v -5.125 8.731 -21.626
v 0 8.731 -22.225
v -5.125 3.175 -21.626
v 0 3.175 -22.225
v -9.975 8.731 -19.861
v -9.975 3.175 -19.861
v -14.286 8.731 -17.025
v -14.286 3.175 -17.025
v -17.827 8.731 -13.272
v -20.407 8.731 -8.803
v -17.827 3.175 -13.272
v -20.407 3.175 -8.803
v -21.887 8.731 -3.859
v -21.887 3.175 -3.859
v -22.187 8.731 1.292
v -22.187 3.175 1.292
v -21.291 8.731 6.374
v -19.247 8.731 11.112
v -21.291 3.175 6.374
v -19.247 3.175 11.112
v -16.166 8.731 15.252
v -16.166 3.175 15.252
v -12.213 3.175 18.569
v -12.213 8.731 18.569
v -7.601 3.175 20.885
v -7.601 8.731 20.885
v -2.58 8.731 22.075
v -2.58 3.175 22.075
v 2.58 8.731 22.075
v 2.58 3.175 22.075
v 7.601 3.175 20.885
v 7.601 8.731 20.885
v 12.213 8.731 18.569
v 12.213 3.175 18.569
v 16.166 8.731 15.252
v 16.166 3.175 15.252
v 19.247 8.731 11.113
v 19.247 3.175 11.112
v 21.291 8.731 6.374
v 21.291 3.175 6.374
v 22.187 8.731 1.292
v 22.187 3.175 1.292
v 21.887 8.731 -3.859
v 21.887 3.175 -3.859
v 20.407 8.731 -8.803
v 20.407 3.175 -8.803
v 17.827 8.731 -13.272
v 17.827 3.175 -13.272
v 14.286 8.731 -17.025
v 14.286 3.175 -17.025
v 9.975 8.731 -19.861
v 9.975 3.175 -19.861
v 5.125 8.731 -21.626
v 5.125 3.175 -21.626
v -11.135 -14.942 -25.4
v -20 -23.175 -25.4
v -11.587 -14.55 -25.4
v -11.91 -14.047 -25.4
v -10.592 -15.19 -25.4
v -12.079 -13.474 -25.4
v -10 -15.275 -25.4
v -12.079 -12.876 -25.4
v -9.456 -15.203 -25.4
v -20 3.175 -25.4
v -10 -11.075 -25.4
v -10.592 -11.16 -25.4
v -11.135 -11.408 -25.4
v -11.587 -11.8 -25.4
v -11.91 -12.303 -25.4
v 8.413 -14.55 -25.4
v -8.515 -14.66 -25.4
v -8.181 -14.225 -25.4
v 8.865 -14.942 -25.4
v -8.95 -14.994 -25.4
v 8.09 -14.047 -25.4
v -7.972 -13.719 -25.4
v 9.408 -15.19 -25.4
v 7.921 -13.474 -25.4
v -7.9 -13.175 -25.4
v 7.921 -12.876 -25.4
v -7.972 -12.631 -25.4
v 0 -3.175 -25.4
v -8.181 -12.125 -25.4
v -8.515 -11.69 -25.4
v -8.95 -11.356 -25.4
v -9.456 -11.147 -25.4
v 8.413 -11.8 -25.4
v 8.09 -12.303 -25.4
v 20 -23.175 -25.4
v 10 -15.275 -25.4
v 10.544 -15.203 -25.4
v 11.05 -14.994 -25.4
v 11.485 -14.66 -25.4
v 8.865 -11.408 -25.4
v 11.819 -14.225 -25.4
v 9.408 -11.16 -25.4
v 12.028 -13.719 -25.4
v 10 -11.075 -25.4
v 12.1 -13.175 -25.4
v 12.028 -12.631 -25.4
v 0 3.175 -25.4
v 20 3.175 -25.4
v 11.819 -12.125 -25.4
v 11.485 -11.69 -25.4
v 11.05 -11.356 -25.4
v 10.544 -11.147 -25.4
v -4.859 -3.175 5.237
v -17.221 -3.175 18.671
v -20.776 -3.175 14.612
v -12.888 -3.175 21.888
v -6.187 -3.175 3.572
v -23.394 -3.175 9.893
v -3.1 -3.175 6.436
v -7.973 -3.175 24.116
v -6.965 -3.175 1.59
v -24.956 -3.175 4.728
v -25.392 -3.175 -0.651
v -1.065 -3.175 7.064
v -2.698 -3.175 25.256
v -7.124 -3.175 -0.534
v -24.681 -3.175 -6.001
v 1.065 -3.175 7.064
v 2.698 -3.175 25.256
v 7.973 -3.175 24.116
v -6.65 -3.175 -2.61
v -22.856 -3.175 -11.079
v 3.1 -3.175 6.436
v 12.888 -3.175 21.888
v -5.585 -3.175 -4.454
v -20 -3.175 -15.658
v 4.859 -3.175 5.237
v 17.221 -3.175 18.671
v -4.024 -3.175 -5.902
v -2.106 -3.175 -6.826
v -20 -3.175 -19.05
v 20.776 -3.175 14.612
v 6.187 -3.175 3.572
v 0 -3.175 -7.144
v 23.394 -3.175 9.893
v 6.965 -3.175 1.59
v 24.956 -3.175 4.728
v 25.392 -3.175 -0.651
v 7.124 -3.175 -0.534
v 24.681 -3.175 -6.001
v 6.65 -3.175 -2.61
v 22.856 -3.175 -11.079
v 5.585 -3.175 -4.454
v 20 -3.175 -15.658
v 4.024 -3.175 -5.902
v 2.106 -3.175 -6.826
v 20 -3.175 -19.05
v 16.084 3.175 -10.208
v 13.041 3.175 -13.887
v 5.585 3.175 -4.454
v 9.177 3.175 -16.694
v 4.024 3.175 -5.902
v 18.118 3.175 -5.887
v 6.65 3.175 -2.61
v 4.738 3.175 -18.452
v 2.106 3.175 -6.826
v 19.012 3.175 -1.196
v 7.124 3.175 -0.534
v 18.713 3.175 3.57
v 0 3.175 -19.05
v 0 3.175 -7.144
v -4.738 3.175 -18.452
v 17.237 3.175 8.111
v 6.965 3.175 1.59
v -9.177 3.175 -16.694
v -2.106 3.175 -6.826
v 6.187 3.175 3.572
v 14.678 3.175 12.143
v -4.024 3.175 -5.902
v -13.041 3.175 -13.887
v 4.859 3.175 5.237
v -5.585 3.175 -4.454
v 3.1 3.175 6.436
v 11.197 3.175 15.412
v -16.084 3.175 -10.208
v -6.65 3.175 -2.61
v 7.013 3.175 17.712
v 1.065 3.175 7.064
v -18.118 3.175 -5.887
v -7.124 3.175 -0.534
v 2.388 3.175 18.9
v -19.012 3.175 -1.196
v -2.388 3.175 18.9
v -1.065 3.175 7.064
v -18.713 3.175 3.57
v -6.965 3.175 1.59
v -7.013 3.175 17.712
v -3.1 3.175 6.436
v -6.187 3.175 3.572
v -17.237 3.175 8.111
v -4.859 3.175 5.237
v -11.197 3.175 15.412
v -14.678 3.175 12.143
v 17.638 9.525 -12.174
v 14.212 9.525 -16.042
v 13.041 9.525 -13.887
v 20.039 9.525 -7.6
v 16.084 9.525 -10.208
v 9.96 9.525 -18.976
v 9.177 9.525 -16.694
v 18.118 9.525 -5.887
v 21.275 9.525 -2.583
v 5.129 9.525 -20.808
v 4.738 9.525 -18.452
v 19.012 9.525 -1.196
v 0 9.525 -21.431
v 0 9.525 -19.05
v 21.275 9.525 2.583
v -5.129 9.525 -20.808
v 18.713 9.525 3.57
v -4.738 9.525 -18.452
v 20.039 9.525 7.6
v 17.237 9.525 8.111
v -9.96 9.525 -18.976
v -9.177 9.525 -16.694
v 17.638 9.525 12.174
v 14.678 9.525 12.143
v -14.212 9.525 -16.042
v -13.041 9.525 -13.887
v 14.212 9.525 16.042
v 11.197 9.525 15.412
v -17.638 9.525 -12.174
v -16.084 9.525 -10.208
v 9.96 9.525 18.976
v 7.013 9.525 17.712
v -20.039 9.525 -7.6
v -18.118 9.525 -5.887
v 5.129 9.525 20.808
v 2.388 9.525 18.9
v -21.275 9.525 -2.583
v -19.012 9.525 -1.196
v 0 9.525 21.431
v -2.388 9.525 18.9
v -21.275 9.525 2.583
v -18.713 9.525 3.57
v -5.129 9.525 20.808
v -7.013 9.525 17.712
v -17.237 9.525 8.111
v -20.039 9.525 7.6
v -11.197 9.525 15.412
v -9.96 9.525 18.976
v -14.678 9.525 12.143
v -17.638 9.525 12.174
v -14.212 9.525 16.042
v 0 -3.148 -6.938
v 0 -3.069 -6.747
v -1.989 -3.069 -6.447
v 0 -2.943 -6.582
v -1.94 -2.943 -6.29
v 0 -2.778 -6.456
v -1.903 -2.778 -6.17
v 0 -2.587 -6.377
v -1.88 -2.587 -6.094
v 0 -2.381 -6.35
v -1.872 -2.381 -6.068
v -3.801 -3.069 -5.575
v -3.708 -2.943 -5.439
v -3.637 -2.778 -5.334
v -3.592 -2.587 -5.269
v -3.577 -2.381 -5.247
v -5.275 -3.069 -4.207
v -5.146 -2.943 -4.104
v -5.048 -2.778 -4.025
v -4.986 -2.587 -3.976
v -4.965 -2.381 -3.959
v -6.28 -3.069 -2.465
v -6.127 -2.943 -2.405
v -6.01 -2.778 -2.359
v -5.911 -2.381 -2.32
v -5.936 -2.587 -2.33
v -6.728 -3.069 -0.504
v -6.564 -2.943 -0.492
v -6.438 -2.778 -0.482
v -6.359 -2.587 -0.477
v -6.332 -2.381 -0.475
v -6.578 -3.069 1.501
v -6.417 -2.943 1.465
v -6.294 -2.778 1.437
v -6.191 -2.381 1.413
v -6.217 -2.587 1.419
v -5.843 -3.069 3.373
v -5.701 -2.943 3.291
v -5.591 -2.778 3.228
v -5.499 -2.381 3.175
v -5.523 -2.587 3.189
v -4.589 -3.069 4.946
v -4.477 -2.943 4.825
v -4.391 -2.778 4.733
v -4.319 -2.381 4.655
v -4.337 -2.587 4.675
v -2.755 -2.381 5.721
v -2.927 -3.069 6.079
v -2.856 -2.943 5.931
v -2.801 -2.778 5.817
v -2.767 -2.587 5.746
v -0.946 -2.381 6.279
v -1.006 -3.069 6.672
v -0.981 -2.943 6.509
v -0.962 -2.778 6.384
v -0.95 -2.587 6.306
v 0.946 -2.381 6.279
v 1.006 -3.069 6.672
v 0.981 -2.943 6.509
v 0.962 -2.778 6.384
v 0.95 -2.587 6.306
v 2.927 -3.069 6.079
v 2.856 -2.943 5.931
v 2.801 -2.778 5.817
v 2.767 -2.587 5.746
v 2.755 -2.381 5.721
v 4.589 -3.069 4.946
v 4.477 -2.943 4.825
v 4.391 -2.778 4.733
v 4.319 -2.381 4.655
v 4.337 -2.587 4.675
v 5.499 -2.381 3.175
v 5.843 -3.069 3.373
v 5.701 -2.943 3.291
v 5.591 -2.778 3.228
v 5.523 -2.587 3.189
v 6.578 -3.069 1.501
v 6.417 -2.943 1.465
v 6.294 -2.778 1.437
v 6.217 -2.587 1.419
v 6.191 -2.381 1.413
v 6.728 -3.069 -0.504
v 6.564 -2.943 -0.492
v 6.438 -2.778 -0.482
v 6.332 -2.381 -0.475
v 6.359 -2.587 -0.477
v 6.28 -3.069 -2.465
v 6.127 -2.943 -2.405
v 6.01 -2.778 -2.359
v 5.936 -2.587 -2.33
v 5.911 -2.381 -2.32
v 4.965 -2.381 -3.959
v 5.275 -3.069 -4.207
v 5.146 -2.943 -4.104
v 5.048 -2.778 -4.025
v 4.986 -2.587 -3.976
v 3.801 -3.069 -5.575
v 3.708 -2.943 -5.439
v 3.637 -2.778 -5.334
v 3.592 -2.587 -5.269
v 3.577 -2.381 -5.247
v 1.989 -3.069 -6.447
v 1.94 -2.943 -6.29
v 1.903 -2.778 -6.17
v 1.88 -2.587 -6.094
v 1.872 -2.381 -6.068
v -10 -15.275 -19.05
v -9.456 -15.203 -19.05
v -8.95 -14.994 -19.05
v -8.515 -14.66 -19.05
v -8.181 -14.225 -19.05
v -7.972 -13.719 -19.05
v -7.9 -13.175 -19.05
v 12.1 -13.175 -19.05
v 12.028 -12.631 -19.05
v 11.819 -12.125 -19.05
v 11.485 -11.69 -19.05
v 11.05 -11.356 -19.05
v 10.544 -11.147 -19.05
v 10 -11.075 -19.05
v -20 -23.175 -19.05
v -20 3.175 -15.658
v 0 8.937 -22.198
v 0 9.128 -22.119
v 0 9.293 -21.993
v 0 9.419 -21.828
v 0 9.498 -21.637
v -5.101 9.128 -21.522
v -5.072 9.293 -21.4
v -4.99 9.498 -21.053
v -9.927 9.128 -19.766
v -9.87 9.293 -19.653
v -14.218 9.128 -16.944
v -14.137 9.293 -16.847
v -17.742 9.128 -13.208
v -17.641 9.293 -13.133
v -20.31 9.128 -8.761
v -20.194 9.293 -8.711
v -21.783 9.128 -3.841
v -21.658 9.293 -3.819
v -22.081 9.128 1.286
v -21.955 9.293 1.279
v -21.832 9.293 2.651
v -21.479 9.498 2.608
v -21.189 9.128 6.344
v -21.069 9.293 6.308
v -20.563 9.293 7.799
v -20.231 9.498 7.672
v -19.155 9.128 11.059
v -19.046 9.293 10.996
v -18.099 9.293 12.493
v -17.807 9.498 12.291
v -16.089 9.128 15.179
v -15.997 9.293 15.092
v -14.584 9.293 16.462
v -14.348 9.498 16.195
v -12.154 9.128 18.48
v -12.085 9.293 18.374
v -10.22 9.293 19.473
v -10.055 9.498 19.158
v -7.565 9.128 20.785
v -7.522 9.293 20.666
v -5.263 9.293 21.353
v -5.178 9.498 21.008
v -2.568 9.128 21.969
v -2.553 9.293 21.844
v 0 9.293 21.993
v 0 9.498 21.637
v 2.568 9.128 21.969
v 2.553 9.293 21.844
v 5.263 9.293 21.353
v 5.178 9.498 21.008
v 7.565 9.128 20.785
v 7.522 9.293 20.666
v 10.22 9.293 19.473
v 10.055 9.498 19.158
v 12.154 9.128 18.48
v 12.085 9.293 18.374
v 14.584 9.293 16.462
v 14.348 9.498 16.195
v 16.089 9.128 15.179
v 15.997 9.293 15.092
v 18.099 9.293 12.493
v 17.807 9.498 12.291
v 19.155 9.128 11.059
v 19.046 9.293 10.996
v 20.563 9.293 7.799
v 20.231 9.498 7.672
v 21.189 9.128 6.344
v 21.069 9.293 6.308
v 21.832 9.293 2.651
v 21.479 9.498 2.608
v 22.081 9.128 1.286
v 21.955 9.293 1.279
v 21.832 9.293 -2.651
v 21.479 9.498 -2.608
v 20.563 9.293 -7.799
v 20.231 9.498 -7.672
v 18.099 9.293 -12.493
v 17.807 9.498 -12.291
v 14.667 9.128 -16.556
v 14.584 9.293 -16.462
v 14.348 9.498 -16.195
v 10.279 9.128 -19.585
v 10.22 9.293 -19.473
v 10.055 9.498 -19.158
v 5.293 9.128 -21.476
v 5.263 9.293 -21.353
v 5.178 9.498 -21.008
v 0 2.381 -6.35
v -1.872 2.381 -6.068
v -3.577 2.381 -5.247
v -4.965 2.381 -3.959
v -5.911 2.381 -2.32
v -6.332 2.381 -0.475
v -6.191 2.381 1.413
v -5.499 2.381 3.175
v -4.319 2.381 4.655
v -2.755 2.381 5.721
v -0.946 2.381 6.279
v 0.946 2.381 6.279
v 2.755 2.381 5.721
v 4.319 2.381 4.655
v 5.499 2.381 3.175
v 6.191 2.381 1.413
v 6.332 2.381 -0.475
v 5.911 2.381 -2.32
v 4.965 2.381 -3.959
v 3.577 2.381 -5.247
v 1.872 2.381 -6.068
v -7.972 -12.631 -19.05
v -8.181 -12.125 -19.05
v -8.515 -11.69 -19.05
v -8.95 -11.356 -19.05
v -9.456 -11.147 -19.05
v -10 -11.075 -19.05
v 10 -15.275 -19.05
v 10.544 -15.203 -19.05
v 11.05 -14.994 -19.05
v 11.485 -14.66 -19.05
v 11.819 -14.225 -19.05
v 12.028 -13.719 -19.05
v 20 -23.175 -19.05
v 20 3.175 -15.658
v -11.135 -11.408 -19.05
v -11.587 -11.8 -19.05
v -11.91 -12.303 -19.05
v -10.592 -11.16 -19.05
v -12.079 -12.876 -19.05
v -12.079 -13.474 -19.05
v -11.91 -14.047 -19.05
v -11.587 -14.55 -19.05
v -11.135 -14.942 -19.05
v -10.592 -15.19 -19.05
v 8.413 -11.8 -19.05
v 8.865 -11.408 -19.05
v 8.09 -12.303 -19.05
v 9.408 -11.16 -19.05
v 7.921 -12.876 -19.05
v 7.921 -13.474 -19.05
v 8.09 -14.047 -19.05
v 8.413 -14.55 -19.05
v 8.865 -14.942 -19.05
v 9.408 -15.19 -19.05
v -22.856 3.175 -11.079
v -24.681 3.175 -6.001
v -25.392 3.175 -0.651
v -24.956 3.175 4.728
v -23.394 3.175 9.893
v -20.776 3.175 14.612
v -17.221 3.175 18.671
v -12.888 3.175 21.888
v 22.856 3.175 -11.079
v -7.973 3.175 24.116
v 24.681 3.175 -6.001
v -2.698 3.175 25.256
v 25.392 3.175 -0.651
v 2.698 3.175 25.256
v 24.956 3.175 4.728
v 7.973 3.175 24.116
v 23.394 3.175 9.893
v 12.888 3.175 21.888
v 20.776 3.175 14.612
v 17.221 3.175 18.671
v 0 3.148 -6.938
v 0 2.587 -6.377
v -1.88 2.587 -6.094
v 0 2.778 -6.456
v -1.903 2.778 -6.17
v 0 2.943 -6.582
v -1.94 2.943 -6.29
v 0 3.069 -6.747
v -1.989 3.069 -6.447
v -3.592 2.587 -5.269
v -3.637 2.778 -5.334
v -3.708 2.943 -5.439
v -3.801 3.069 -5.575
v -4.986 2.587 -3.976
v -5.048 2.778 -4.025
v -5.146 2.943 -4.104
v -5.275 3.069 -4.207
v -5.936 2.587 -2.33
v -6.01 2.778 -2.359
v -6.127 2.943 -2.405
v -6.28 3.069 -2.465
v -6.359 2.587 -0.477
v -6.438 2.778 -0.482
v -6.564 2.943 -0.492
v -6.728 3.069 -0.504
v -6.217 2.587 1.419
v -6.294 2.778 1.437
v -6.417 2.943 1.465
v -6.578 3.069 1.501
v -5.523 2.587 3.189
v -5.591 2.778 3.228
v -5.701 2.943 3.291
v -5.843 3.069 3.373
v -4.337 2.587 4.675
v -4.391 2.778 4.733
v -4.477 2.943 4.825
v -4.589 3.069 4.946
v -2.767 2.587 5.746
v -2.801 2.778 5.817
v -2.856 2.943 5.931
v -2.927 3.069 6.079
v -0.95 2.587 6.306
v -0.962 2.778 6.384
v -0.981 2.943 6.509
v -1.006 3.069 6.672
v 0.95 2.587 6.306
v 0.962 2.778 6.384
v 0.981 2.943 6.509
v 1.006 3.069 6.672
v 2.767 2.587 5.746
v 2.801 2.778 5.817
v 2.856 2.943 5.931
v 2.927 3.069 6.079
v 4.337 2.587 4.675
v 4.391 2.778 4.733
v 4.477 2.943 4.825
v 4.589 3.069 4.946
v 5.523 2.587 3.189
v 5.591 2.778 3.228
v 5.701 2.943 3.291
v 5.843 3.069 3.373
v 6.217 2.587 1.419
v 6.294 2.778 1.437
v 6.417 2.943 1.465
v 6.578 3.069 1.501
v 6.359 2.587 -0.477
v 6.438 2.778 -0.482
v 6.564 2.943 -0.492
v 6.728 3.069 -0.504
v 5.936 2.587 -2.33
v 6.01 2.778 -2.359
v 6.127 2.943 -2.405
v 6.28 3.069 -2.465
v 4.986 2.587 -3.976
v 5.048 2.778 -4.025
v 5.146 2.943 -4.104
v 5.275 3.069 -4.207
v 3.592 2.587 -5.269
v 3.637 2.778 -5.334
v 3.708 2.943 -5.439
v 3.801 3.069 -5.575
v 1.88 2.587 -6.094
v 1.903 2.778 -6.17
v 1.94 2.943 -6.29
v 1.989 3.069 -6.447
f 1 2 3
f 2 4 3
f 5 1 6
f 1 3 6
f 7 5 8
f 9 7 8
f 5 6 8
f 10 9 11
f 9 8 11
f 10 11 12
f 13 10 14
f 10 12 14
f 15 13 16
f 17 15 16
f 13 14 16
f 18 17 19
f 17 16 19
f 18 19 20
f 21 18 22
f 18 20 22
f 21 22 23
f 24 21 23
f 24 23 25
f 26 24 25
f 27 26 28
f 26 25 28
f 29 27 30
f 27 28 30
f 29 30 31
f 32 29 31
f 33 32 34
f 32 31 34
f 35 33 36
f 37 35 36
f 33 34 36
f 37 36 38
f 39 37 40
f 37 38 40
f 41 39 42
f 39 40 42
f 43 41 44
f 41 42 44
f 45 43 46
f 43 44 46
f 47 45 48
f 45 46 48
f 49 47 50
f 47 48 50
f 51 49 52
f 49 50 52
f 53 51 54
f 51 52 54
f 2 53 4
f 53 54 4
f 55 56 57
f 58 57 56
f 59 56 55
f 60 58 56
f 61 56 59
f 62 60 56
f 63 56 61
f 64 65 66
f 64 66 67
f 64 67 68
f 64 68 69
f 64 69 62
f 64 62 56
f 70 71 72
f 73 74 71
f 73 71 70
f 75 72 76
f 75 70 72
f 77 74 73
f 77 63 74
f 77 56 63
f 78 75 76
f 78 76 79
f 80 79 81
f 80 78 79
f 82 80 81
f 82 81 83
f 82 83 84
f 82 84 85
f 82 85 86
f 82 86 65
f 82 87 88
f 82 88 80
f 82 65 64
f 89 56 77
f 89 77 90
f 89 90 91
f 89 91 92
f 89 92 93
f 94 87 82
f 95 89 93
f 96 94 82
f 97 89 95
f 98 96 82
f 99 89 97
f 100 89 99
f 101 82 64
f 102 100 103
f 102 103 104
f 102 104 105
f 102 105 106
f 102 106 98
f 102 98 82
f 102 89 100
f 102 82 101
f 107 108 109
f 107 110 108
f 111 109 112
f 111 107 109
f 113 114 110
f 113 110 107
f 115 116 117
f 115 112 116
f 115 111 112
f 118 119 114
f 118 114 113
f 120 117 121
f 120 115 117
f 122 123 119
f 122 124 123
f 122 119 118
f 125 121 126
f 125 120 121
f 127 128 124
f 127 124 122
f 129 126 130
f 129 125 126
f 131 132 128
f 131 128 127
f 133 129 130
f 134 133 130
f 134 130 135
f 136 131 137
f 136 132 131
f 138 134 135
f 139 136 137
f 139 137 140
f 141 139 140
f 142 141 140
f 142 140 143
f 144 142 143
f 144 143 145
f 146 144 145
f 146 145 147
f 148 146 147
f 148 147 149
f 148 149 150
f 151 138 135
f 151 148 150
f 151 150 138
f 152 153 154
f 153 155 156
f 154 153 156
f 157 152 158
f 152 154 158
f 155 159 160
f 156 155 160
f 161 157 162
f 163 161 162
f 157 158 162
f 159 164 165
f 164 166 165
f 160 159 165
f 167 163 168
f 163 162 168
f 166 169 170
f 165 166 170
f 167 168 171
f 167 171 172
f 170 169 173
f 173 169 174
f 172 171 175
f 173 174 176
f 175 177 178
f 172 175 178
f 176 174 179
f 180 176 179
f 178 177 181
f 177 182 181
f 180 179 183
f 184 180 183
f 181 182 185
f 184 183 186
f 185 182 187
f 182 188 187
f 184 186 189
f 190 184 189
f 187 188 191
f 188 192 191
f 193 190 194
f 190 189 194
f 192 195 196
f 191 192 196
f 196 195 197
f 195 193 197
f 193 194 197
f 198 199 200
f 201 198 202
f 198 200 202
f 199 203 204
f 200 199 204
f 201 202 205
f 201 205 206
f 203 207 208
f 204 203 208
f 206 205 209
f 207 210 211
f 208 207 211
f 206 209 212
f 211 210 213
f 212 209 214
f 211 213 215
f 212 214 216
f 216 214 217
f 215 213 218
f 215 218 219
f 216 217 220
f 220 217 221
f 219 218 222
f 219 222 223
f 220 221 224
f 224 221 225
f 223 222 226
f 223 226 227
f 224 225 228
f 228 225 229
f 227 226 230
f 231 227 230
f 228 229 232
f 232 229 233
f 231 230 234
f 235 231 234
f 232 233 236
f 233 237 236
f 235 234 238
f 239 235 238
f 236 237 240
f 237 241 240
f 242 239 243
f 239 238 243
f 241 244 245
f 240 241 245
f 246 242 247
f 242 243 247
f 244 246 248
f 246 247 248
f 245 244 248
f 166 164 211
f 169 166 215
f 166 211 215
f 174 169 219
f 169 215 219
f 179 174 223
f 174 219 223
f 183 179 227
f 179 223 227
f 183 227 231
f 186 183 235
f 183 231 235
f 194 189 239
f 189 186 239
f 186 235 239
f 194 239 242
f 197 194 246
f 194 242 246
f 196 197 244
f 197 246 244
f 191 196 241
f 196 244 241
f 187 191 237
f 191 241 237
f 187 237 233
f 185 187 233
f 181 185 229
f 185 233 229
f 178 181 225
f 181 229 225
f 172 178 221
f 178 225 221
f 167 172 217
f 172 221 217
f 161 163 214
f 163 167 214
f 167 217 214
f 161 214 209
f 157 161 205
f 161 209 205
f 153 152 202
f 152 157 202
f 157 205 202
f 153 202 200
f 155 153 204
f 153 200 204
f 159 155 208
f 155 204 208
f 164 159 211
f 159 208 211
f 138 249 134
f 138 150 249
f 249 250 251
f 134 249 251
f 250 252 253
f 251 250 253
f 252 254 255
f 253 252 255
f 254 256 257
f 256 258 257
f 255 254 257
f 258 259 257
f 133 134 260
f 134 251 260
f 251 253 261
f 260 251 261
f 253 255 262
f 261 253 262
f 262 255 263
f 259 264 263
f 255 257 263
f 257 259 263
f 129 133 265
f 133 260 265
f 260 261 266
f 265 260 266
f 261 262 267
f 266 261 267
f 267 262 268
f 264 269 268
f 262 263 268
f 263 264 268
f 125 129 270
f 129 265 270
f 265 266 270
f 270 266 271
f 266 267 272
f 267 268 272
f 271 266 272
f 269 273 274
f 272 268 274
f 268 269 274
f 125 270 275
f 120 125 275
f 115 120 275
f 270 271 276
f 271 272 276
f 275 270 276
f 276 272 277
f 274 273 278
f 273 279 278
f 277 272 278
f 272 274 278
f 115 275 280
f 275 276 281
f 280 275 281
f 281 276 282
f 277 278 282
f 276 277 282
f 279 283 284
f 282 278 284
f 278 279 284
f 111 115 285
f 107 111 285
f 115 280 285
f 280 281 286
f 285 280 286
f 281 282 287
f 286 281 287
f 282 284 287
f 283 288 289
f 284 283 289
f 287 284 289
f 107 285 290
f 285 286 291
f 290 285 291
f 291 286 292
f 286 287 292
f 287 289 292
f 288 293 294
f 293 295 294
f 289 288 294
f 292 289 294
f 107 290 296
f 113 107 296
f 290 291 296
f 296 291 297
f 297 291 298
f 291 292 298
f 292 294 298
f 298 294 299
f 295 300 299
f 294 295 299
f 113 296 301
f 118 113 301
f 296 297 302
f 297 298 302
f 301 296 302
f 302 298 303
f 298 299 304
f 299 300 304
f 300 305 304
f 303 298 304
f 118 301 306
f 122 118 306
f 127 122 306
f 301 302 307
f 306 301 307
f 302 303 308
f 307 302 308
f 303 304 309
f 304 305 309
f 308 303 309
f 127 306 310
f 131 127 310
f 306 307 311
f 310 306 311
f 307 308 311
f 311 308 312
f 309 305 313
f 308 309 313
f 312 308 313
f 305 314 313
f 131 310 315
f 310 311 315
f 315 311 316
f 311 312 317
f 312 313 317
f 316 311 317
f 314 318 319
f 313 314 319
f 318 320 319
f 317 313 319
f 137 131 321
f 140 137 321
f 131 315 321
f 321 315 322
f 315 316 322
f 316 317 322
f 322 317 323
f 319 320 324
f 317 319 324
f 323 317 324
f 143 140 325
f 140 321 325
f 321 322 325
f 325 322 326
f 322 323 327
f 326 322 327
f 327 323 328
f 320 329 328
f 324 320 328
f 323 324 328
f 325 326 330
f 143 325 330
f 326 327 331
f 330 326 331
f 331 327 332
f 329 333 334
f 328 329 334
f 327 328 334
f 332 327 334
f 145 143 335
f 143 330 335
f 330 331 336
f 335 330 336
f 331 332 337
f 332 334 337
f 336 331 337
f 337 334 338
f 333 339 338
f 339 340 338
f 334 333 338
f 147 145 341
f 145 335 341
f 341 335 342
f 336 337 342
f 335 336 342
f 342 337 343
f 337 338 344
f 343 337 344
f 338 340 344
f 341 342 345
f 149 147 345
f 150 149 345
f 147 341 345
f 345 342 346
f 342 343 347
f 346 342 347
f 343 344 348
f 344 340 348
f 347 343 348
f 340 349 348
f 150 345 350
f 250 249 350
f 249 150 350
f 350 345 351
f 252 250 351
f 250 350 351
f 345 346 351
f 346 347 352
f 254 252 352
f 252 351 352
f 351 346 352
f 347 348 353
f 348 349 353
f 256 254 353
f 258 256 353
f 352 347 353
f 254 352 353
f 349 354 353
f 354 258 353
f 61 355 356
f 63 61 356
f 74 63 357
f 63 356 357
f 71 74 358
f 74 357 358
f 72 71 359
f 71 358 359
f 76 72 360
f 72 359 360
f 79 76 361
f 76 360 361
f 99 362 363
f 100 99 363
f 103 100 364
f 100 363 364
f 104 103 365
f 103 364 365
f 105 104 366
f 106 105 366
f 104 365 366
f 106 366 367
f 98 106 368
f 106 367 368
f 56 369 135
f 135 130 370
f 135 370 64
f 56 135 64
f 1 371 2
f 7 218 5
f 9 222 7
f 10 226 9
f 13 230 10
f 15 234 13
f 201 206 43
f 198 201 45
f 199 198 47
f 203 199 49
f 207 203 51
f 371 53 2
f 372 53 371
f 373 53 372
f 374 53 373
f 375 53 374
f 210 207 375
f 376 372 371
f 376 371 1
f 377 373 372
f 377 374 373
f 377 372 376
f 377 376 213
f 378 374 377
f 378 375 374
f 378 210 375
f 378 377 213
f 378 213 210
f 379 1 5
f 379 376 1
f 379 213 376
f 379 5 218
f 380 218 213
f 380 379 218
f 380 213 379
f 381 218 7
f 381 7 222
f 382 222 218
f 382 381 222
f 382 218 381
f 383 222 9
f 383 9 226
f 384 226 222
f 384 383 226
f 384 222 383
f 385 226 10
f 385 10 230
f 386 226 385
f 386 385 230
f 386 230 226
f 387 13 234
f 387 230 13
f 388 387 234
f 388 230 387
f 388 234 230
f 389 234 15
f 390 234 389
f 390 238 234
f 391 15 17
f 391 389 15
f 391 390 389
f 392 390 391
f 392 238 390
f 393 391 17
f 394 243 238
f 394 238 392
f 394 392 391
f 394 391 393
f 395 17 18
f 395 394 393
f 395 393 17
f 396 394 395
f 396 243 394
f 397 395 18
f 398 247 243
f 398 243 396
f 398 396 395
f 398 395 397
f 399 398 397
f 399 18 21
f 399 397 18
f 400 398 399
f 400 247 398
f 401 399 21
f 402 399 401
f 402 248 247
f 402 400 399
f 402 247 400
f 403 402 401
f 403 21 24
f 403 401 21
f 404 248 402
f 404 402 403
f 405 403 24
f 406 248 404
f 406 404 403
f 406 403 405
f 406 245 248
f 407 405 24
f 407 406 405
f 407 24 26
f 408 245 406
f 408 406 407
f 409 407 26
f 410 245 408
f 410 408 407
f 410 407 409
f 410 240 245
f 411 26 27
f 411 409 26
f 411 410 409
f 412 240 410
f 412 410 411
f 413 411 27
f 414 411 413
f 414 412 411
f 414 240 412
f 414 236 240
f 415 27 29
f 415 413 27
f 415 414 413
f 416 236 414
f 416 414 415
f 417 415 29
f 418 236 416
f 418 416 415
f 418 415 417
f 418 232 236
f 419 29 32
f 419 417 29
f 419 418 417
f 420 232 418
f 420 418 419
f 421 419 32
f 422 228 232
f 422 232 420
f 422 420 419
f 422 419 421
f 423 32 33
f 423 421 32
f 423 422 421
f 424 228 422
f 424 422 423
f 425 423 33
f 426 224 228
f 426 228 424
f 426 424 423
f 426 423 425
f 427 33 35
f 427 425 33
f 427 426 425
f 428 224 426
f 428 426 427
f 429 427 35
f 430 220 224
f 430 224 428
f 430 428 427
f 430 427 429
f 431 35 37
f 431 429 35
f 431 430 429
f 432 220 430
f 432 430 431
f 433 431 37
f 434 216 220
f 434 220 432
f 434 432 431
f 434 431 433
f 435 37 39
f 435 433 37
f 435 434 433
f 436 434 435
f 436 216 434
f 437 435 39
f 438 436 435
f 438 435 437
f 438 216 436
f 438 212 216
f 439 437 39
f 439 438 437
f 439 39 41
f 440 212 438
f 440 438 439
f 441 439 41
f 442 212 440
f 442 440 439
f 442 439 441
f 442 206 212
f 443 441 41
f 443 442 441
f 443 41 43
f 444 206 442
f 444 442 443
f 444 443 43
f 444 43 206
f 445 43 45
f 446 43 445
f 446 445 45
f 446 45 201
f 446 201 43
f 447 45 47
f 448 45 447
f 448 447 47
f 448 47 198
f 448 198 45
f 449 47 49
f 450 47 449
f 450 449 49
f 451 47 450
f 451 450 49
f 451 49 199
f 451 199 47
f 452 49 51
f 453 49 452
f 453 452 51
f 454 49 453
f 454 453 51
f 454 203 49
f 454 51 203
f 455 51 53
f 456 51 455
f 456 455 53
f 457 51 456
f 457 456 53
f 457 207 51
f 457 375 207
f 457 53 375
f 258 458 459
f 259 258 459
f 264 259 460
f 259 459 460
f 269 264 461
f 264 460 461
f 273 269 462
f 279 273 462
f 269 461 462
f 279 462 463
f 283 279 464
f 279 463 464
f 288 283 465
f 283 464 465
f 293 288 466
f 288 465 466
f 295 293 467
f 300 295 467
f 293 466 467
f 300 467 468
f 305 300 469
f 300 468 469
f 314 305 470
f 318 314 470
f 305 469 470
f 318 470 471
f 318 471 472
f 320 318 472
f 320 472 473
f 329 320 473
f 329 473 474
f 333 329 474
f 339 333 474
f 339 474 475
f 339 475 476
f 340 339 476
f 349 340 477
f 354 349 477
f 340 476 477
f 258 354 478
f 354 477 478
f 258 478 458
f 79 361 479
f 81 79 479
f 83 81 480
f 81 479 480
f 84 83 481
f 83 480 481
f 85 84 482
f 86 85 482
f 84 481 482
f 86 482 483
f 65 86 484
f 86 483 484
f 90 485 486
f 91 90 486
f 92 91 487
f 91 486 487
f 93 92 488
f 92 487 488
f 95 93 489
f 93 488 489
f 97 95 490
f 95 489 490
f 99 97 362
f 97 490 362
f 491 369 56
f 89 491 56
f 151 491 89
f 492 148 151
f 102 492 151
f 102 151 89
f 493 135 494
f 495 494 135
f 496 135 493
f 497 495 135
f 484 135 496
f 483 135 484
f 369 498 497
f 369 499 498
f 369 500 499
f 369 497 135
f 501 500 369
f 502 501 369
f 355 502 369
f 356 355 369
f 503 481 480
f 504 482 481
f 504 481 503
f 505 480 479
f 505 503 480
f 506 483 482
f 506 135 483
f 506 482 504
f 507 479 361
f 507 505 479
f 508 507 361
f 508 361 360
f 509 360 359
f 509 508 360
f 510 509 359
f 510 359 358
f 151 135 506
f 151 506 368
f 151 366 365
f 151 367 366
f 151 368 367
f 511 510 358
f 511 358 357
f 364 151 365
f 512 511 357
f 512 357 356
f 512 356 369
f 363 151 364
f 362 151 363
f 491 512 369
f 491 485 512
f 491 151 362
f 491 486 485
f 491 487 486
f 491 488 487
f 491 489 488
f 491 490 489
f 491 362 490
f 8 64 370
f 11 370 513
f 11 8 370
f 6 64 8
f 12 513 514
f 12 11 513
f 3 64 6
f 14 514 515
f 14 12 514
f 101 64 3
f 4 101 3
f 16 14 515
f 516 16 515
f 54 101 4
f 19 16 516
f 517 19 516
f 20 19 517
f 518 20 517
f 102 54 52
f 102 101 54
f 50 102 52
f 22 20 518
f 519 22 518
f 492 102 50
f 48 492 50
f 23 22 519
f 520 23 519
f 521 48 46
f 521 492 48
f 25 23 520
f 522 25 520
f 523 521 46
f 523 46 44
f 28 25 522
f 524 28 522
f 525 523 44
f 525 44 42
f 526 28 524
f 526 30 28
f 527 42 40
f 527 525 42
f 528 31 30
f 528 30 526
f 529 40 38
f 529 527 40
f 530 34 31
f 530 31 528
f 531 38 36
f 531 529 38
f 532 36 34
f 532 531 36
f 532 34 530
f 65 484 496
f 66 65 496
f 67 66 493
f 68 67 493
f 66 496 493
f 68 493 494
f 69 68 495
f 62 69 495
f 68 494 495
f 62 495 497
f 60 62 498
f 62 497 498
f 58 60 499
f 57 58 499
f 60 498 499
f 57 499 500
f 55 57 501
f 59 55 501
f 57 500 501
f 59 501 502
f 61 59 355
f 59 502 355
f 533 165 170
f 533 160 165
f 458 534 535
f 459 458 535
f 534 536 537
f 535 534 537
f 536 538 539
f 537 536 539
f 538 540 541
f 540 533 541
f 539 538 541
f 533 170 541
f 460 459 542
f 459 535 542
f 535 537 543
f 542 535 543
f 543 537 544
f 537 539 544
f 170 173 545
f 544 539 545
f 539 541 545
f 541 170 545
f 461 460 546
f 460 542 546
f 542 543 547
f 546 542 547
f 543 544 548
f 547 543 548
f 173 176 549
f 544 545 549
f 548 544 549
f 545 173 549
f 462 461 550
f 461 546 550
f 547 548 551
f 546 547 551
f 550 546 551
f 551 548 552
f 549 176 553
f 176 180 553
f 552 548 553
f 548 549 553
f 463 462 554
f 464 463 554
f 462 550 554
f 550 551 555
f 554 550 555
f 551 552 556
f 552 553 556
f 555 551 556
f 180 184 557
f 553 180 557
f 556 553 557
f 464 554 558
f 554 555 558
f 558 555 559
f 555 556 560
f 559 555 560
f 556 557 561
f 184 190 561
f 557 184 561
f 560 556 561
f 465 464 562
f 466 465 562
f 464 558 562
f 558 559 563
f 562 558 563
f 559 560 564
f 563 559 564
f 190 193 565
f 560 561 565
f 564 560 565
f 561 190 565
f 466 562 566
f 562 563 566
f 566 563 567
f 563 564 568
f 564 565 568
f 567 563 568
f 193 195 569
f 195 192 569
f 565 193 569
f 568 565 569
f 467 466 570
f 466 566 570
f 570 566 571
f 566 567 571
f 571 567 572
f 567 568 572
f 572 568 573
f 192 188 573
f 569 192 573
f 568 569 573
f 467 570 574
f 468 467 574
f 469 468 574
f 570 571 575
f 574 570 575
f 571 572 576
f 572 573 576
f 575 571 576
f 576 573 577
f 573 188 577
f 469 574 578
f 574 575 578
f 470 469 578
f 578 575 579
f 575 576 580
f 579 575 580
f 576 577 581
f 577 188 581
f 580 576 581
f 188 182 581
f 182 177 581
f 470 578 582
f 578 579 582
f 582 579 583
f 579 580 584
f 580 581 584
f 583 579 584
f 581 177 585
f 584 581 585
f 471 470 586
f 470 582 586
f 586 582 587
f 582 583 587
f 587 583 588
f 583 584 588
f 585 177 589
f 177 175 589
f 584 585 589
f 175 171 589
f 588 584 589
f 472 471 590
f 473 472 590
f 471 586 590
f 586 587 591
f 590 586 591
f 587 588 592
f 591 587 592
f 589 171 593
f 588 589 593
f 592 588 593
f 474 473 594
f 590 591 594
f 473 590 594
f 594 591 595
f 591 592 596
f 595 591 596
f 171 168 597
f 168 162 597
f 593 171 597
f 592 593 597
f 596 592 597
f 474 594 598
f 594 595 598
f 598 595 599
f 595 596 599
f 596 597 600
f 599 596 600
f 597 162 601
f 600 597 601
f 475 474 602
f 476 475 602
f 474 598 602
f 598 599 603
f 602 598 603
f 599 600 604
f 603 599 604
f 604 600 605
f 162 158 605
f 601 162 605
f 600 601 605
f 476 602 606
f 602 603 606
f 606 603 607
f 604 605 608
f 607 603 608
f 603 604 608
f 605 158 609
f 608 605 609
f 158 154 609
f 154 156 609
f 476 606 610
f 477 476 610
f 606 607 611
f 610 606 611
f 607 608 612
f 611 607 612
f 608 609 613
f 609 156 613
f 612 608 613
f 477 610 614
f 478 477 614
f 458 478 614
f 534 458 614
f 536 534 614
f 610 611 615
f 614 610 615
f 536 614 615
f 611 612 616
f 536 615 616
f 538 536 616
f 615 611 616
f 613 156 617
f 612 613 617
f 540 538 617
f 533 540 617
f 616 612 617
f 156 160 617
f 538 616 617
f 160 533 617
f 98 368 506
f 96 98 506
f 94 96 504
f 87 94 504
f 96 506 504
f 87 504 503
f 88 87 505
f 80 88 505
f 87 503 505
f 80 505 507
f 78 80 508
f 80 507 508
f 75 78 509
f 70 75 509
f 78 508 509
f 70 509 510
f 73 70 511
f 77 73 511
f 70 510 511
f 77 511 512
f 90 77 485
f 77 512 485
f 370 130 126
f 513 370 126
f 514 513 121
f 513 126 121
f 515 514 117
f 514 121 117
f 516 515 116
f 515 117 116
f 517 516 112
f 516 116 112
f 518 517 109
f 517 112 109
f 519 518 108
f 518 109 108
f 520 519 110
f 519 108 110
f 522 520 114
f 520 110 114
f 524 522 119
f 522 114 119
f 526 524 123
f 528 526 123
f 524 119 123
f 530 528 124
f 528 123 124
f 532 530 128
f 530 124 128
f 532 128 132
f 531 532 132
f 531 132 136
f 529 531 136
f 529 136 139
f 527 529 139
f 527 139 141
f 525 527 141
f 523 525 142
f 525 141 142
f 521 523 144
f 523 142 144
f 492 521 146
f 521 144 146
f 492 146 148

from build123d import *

# Parameters (mm, degrees)
FILLET1_R           = 0.79375
BOSS_EXTRUDE1_DEPTH = 20
CUT_EXTRUDE1_DEPTH  = 7.35


with BuildPart() as part:
    # Sketch1 → Revolve1 (revolve)
    with BuildSketch(Plane(origin=(0, 0, 0), x_dir=(0, 0, -1), z_dir=(1, 0, 0))):
        Polygon((22.225, 9.525), (22.225, 3.175), (25.4, 3.175), (25.4, -3.175), (6.35, -3.175), (6.35, 3.175), (19.05, 3.175), (19.05, 9.525), align=None)
    revolve(axis=Axis((0, -32.325211936, 0), (0, 1, 0)))

    # Fillet1
    fillet1_edges = [part.edges().sort_by_distance(p)[0] for p in [
        (0, 9.525, 22.225),
        (0, 3.175, 6.35),
        (0, -3.175, 6.35),
    ]]
    fillet(fillet1_edges, radius=FILLET1_R)

    # Sketch2 → Boss-Extrude1 (add, symmetric)
    with BuildSketch(Plane(origin=(0, 0, 0), x_dir=(0, 0, -1), z_dir=(1, 0, 0))):
        Polygon((25.4, 3.175), (12.7, 3.175), (12.7, -3.175), (19.05, -3.175), (19.05, -23.174999878), (25.4, -23.174999878), (25.4, -3.175), align=None)
    extrude(amount=BOSS_EXTRUDE1_DEPTH, both=True)

    # Sketch3 → Cut-Extrude1 (cut, through all)
    with BuildSketch(Plane.XY.offset(-19.05)):
        with BuildLine():
            ThreePointArc((-10, -11.075), (-12.1, -13.175), (-10, -15.275))
            ThreePointArc((-10, -15.275), (-8.51507576, -14.65992424), (-7.9, -13.175))
            ThreePointArc((-7.9, -13.175), (-8.51507576, -11.69007576), (-10, -11.075))
        make_face()
        with BuildLine():
            ThreePointArc((10, -11.075), (7.9, -13.175), (10, -15.275))
            ThreePointArc((10, -15.275), (11.48492424, -14.65992424), (12.1, -13.175))
            ThreePointArc((12.1, -13.175), (11.48492424, -11.69007576), (10, -11.075))
        make_face()
    extrude(amount=-CUT_EXTRUDE1_DEPTH, mode=Mode.SUBTRACT)


solid = part.part
